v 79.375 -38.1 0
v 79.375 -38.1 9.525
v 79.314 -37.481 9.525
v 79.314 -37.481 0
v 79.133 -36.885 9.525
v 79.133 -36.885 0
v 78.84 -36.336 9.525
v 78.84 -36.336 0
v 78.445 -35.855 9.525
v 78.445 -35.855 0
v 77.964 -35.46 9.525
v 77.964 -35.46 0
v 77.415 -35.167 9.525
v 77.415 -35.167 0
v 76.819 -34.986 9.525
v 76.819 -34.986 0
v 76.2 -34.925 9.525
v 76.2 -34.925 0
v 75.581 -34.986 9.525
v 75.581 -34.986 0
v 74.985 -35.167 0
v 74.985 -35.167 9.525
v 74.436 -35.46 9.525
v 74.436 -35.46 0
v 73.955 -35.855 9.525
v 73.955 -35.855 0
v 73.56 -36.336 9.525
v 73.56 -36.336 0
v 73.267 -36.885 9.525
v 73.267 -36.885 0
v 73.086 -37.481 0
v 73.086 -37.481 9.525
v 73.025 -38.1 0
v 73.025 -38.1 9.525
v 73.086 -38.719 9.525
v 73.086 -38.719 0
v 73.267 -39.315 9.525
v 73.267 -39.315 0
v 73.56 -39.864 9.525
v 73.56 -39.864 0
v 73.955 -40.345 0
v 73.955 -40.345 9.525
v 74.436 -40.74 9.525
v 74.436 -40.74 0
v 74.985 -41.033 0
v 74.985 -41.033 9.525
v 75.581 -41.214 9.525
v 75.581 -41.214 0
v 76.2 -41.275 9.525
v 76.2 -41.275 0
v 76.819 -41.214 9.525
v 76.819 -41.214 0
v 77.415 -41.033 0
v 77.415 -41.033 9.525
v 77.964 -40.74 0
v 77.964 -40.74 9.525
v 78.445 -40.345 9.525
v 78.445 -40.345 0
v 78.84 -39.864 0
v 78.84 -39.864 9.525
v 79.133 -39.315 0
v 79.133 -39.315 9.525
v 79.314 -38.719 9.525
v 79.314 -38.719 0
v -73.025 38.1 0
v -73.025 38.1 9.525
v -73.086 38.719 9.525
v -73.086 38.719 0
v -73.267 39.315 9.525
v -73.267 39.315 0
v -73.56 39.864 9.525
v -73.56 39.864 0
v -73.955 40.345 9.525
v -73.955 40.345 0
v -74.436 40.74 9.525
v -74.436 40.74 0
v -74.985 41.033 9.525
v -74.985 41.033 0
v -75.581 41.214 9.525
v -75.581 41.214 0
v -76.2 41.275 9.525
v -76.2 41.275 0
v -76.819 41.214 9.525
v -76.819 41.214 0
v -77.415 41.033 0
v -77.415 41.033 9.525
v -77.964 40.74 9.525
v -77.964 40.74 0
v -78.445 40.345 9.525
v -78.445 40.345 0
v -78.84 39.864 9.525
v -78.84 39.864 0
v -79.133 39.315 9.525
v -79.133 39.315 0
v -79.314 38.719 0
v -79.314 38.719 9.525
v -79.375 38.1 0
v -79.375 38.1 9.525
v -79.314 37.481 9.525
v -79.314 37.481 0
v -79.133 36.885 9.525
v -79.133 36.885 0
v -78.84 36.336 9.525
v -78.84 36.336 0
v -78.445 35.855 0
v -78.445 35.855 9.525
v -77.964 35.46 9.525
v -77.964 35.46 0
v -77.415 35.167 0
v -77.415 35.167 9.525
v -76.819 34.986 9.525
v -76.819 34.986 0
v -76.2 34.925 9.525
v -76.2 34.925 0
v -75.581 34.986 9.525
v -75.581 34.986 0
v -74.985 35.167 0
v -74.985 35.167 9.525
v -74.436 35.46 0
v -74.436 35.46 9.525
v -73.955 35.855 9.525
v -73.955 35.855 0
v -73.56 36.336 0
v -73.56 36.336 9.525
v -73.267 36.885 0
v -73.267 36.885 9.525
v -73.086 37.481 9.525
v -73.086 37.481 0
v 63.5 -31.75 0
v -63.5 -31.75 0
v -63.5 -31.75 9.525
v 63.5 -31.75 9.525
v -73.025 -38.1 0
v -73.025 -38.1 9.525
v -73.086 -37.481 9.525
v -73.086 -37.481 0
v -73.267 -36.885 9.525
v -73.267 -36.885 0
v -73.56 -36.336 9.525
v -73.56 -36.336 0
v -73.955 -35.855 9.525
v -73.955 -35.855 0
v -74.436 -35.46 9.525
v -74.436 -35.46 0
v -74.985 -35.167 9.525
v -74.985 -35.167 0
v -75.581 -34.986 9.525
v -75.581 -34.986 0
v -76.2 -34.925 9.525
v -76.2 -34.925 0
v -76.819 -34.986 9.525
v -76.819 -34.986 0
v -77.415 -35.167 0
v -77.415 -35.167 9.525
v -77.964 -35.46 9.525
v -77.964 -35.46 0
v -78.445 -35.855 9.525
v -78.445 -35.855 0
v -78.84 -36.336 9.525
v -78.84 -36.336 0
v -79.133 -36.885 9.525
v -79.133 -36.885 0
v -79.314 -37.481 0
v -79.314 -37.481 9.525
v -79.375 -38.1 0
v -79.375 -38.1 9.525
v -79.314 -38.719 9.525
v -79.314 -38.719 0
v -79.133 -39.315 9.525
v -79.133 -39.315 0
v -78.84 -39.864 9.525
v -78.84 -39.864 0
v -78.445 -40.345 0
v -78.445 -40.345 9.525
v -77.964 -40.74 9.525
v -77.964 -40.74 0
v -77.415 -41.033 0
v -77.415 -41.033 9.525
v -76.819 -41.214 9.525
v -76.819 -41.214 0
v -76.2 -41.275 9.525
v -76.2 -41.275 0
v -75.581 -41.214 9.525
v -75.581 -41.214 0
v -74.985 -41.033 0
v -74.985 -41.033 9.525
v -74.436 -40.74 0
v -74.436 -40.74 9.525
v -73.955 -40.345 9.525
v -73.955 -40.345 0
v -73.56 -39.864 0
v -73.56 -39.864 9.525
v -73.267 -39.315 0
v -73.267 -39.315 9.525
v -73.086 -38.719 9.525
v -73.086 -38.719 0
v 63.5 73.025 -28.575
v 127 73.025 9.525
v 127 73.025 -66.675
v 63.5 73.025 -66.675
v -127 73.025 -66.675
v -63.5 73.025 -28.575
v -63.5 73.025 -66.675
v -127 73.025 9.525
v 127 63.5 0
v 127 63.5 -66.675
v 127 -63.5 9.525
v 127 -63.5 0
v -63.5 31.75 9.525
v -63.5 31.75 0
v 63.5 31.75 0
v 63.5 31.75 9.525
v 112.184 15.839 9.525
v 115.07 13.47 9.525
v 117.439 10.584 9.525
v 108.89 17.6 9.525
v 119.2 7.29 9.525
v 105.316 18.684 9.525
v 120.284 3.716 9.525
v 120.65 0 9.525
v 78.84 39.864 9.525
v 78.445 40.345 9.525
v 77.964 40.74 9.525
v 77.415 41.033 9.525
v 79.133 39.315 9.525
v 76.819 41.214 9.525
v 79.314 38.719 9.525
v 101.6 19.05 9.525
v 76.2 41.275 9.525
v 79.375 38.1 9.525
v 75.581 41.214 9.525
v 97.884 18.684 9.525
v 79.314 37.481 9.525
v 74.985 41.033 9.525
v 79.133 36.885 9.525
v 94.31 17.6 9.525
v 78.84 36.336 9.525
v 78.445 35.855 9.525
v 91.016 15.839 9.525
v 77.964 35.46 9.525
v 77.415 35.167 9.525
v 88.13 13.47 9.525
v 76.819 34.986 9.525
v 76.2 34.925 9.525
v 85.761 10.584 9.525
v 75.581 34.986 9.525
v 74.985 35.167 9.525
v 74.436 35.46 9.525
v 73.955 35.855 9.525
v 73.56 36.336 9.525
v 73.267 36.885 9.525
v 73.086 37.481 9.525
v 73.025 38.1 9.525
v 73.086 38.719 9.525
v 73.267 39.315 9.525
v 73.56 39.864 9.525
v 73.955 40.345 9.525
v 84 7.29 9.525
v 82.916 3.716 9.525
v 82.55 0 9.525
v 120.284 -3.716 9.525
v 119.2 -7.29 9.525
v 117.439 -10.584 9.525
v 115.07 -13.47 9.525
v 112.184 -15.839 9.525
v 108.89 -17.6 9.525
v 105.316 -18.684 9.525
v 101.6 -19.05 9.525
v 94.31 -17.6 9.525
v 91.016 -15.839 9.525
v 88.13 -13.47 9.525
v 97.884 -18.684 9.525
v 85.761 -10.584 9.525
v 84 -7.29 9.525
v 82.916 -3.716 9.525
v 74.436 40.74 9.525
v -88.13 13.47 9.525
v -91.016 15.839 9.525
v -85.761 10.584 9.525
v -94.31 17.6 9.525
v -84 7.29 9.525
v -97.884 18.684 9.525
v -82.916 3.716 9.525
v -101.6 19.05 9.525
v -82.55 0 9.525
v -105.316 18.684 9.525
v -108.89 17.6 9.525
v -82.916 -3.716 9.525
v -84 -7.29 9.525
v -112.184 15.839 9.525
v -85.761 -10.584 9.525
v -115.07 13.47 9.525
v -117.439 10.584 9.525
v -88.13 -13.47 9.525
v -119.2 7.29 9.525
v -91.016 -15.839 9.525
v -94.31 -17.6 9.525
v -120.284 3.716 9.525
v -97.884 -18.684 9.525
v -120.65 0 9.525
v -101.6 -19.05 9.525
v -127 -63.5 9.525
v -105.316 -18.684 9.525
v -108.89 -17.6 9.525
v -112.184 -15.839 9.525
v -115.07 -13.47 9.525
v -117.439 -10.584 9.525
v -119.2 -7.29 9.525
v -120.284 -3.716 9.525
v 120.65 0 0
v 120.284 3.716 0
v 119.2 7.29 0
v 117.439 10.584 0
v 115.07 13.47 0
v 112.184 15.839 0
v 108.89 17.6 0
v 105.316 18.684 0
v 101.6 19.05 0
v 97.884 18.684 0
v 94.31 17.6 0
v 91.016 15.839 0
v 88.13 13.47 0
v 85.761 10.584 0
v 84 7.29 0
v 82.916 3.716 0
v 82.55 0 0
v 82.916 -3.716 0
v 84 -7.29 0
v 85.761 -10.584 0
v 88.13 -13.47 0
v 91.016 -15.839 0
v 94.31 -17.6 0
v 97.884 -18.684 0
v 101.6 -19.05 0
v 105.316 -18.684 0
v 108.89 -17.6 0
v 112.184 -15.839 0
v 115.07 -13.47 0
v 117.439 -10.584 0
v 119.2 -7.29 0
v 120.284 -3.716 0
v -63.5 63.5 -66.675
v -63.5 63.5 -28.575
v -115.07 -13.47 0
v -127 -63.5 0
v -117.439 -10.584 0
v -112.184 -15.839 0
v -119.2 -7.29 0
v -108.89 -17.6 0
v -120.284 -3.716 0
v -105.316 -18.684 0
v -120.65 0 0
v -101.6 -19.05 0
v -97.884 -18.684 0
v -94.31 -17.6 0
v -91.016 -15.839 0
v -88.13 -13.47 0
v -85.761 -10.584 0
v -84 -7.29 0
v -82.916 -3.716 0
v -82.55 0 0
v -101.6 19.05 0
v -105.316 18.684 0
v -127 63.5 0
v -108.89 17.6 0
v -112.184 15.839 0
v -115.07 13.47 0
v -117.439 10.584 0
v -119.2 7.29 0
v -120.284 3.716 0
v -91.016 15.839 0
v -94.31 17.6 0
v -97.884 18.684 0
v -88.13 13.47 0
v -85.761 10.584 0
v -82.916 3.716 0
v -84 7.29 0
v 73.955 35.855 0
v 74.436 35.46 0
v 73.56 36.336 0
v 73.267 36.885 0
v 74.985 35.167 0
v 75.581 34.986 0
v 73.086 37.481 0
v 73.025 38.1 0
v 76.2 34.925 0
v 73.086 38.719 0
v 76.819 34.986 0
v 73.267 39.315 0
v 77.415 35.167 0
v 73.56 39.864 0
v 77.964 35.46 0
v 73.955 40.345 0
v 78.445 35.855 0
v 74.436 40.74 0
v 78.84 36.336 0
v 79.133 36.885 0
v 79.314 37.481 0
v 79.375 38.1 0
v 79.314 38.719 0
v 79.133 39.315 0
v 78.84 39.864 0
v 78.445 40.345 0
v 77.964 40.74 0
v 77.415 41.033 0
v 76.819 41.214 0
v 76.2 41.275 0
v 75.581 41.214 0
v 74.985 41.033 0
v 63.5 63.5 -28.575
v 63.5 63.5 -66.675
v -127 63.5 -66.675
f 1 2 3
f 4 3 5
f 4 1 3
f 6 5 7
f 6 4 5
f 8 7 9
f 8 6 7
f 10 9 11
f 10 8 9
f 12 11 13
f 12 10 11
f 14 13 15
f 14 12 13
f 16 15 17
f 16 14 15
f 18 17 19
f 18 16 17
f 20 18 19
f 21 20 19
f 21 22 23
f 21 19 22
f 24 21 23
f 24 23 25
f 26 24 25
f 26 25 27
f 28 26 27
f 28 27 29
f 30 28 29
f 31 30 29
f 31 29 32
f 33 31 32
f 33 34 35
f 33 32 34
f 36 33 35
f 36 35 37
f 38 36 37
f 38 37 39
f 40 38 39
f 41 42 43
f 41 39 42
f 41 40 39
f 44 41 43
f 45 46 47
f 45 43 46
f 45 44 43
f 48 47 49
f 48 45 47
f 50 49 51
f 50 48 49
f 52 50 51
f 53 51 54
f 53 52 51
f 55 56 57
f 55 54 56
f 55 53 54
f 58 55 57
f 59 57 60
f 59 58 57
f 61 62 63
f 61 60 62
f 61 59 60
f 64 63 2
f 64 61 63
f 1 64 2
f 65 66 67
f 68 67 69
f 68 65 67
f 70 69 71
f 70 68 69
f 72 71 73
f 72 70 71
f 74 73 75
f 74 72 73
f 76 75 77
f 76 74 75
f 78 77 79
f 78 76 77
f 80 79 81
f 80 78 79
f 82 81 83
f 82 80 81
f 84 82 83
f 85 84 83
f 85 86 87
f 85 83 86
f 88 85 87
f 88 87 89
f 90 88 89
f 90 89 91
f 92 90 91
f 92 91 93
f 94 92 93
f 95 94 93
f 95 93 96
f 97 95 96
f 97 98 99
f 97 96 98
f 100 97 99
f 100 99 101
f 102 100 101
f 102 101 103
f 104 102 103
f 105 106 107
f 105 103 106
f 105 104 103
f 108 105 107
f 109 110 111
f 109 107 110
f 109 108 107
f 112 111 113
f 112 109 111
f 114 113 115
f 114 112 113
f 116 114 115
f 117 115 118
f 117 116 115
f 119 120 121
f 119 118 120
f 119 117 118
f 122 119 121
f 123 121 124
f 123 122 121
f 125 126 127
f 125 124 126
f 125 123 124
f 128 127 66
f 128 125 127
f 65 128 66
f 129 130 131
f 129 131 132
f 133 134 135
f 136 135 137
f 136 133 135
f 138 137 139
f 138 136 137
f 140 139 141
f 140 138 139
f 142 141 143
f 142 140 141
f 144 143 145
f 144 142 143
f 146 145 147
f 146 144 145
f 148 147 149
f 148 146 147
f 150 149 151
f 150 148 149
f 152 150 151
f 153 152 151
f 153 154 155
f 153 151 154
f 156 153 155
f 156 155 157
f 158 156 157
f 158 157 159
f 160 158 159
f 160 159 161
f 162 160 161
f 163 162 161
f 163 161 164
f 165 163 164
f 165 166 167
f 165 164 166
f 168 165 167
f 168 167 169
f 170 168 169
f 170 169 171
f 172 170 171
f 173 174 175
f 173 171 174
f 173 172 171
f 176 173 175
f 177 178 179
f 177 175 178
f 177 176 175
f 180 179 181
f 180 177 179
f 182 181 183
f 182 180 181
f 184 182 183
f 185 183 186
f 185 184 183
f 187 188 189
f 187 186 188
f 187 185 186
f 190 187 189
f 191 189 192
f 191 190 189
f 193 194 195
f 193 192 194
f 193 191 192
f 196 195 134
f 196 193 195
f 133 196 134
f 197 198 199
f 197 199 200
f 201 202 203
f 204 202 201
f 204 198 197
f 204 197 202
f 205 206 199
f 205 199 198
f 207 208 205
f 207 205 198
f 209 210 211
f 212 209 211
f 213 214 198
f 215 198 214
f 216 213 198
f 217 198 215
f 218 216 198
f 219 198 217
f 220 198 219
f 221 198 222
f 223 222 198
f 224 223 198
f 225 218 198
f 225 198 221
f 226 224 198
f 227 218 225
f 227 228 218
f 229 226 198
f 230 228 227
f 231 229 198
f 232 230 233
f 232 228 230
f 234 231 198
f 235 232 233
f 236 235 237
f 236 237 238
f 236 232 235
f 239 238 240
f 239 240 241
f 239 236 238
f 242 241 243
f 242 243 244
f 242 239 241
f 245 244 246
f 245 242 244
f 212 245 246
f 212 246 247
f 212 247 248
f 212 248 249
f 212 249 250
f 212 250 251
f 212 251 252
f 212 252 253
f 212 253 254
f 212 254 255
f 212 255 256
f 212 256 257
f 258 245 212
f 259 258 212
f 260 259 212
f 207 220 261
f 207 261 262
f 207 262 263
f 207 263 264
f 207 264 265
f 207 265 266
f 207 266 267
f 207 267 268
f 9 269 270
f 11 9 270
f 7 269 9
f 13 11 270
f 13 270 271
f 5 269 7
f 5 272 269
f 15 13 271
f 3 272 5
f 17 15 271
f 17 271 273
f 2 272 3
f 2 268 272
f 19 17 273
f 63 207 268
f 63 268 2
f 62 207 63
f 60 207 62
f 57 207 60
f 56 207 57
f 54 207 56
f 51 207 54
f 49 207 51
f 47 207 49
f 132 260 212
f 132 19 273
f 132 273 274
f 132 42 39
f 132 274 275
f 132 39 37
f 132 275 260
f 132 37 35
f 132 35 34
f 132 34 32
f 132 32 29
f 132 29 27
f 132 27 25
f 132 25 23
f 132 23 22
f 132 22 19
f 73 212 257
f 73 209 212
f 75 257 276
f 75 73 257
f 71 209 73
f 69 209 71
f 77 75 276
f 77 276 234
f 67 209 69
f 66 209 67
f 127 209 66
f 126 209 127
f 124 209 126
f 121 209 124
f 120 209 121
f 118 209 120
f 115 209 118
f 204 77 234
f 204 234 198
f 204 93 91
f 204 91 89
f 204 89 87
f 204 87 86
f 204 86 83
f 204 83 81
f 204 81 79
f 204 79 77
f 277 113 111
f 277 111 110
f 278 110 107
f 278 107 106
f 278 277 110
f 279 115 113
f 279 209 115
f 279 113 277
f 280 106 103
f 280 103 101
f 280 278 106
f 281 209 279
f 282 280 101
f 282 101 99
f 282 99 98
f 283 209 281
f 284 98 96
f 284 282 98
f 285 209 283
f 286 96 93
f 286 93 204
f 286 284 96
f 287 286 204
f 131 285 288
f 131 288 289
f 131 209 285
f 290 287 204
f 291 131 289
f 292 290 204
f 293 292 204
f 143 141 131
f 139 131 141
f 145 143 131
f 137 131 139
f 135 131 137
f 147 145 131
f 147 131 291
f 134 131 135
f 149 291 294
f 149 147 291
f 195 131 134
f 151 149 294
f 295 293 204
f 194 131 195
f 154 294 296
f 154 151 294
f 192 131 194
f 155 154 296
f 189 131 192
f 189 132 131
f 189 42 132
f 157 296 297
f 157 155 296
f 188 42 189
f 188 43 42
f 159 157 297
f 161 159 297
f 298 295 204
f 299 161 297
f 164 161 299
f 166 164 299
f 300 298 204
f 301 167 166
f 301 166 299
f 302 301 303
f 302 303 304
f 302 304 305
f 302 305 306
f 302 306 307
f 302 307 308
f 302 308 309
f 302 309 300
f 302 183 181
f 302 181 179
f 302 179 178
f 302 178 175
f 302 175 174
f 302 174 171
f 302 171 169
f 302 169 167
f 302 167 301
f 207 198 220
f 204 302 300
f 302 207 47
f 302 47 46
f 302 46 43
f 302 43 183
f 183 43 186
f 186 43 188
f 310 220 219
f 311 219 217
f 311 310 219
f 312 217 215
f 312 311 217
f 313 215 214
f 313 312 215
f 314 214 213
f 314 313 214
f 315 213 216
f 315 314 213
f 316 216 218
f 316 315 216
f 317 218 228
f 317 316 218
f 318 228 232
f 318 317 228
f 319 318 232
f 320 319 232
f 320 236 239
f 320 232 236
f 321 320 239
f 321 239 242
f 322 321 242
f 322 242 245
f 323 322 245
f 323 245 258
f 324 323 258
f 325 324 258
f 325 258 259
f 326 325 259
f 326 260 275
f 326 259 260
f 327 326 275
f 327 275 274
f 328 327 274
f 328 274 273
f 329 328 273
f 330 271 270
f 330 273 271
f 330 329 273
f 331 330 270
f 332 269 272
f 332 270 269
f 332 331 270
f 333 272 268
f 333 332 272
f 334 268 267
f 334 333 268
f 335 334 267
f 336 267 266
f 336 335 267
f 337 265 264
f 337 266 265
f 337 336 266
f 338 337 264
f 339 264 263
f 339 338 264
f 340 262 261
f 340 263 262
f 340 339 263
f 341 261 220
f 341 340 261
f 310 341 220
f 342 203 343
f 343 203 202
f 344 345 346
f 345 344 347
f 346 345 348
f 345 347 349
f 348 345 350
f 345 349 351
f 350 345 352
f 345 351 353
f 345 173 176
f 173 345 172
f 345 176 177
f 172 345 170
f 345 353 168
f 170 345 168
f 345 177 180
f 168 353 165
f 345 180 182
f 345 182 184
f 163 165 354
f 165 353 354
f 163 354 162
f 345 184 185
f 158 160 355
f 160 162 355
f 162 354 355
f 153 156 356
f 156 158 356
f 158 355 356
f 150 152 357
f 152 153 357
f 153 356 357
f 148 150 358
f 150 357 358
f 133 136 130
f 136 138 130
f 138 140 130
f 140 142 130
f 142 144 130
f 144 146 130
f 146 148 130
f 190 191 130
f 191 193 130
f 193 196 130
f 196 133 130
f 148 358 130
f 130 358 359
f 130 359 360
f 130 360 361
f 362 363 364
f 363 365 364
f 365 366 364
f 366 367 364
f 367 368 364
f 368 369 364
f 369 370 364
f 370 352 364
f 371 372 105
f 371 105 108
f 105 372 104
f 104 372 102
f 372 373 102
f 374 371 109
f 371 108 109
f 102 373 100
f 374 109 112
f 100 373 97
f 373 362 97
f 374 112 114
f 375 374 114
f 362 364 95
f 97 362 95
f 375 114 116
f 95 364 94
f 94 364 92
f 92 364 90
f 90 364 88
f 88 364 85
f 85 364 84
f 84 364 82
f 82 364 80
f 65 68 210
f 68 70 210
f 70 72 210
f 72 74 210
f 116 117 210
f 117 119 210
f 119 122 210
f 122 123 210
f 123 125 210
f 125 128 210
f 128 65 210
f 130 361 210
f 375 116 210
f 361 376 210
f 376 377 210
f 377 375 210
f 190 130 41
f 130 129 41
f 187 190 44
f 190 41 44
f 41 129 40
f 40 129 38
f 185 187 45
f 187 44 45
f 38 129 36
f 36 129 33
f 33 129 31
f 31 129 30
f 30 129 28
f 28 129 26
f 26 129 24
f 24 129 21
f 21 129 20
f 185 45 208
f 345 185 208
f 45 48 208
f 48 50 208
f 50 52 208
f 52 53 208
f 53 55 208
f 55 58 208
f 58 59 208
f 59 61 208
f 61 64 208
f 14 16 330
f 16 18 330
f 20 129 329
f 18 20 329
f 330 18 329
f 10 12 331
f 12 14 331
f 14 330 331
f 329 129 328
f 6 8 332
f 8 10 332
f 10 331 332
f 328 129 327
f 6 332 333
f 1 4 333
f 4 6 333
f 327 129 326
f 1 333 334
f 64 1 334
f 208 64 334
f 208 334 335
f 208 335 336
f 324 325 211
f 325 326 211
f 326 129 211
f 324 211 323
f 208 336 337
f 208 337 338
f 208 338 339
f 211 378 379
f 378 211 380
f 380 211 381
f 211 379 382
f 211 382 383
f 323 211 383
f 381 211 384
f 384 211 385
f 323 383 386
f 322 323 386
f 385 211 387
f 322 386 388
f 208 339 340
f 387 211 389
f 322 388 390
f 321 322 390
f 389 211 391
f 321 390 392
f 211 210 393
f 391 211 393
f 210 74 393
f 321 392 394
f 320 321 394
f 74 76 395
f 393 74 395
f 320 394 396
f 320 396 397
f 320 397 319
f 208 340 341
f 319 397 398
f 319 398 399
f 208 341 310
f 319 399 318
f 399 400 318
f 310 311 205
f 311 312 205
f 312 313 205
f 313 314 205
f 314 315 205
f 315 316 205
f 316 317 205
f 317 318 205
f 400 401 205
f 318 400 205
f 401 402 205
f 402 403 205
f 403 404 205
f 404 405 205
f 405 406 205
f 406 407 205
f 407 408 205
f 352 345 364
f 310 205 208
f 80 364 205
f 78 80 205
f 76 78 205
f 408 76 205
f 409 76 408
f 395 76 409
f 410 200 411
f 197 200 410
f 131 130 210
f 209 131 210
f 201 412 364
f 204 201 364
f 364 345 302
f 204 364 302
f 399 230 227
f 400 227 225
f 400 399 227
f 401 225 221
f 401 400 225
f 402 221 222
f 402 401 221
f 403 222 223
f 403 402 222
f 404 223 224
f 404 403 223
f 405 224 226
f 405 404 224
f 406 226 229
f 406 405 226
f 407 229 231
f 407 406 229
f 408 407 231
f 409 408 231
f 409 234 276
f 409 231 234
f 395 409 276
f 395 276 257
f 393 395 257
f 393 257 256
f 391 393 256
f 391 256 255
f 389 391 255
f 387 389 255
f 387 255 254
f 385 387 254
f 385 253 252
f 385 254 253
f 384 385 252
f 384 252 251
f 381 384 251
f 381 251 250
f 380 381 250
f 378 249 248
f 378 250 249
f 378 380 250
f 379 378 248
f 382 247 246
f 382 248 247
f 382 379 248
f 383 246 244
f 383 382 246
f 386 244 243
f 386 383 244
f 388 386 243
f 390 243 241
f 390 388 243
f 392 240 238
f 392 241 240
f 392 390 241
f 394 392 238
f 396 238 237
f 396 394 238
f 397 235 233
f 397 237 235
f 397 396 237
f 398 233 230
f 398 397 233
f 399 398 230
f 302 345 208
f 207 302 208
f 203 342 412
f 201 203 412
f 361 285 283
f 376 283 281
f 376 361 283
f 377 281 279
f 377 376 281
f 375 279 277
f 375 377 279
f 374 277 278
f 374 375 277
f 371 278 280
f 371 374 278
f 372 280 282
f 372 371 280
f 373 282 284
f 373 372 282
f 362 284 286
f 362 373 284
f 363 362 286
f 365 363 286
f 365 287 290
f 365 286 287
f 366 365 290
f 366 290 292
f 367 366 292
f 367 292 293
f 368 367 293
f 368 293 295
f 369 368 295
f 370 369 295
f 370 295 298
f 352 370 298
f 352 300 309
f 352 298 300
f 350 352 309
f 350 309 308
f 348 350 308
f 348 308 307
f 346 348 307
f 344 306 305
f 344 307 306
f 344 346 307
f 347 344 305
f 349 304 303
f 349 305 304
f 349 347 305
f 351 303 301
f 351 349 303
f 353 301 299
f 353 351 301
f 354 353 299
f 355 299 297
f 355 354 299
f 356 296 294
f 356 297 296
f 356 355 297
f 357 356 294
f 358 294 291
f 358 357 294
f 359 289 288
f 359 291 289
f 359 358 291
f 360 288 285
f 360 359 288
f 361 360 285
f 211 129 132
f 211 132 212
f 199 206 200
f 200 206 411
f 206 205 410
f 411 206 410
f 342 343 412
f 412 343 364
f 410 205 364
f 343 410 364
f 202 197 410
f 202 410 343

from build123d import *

# Parameters (mm, degrees)
F0_W     = 254
F0_H     = 127
F0_W_2   = 127
F0_H_2   = 63.5
F1_DEPTH = 9.525
F2_R     = 3.175
F3_DEPTH = 9525
F4_R     = 19.05
F5_DEPTH = 9.526
F6_W     = 254
F6_H     = 76.2
F7_DEPTH = 9.525
F8_W     = 127
F8_H     = 38.1
F9_DEPTH = 136.526


with BuildPart() as f1:
    # F0 (on Top) → F1 (new body)
    with BuildSketch(Plane.XY):
        Rectangle(F0_W, F0_H)
        Rectangle(F0_W_2, F0_H_2, mode=Mode.SUBTRACT)
    extrude(amount=F1_DEPTH)

    # F2 (on Top) → F3 (cut)
    with BuildSketch(Plane.XY):
        with Locations((-76.2, 38.1)):
            Circle(F2_R)
        with Locations((76.2, 38.1)):
            Circle(F2_R)
        with Locations((-76.2, -38.1)):
            Circle(F2_R)
        with Locations((76.2, -38.1)):
            Circle(F2_R)
    extrude(amount=F3_DEPTH, mode=Mode.SUBTRACT)

    # F4 (on Top) → F5 (cut, through all)
    with BuildSketch(Plane.XY):
        with Locations((-101.6, 0)):
            Circle(F4_R)
        with Locations((101.6, 0)):
            Circle(F4_R)
    extrude(amount=F5_DEPTH, mode=Mode.SUBTRACT)

    # F6 (on face) → F7 (join)
    with BuildSketch(Plane(origin=(0, 63.5, 0), x_dir=(-1, 0, 0), z_dir=(0, 1, 0))):
        with Locations((0, -28.575)):
            Rectangle(F6_W, F6_H)
    extrude(amount=F7_DEPTH)

    # F8 (on face) → F9 (cut, through all)
    with BuildSketch(Plane(origin=(0, 73.025, 0), x_dir=(-1, 0, 0), z_dir=(0, 1, 0))):
        with Locations((0, -47.625)):
            Rectangle(F8_W, F8_H)
    extrude(amount=-F9_DEPTH, mode=Mode.SUBTRACT)


solid = f1.part
